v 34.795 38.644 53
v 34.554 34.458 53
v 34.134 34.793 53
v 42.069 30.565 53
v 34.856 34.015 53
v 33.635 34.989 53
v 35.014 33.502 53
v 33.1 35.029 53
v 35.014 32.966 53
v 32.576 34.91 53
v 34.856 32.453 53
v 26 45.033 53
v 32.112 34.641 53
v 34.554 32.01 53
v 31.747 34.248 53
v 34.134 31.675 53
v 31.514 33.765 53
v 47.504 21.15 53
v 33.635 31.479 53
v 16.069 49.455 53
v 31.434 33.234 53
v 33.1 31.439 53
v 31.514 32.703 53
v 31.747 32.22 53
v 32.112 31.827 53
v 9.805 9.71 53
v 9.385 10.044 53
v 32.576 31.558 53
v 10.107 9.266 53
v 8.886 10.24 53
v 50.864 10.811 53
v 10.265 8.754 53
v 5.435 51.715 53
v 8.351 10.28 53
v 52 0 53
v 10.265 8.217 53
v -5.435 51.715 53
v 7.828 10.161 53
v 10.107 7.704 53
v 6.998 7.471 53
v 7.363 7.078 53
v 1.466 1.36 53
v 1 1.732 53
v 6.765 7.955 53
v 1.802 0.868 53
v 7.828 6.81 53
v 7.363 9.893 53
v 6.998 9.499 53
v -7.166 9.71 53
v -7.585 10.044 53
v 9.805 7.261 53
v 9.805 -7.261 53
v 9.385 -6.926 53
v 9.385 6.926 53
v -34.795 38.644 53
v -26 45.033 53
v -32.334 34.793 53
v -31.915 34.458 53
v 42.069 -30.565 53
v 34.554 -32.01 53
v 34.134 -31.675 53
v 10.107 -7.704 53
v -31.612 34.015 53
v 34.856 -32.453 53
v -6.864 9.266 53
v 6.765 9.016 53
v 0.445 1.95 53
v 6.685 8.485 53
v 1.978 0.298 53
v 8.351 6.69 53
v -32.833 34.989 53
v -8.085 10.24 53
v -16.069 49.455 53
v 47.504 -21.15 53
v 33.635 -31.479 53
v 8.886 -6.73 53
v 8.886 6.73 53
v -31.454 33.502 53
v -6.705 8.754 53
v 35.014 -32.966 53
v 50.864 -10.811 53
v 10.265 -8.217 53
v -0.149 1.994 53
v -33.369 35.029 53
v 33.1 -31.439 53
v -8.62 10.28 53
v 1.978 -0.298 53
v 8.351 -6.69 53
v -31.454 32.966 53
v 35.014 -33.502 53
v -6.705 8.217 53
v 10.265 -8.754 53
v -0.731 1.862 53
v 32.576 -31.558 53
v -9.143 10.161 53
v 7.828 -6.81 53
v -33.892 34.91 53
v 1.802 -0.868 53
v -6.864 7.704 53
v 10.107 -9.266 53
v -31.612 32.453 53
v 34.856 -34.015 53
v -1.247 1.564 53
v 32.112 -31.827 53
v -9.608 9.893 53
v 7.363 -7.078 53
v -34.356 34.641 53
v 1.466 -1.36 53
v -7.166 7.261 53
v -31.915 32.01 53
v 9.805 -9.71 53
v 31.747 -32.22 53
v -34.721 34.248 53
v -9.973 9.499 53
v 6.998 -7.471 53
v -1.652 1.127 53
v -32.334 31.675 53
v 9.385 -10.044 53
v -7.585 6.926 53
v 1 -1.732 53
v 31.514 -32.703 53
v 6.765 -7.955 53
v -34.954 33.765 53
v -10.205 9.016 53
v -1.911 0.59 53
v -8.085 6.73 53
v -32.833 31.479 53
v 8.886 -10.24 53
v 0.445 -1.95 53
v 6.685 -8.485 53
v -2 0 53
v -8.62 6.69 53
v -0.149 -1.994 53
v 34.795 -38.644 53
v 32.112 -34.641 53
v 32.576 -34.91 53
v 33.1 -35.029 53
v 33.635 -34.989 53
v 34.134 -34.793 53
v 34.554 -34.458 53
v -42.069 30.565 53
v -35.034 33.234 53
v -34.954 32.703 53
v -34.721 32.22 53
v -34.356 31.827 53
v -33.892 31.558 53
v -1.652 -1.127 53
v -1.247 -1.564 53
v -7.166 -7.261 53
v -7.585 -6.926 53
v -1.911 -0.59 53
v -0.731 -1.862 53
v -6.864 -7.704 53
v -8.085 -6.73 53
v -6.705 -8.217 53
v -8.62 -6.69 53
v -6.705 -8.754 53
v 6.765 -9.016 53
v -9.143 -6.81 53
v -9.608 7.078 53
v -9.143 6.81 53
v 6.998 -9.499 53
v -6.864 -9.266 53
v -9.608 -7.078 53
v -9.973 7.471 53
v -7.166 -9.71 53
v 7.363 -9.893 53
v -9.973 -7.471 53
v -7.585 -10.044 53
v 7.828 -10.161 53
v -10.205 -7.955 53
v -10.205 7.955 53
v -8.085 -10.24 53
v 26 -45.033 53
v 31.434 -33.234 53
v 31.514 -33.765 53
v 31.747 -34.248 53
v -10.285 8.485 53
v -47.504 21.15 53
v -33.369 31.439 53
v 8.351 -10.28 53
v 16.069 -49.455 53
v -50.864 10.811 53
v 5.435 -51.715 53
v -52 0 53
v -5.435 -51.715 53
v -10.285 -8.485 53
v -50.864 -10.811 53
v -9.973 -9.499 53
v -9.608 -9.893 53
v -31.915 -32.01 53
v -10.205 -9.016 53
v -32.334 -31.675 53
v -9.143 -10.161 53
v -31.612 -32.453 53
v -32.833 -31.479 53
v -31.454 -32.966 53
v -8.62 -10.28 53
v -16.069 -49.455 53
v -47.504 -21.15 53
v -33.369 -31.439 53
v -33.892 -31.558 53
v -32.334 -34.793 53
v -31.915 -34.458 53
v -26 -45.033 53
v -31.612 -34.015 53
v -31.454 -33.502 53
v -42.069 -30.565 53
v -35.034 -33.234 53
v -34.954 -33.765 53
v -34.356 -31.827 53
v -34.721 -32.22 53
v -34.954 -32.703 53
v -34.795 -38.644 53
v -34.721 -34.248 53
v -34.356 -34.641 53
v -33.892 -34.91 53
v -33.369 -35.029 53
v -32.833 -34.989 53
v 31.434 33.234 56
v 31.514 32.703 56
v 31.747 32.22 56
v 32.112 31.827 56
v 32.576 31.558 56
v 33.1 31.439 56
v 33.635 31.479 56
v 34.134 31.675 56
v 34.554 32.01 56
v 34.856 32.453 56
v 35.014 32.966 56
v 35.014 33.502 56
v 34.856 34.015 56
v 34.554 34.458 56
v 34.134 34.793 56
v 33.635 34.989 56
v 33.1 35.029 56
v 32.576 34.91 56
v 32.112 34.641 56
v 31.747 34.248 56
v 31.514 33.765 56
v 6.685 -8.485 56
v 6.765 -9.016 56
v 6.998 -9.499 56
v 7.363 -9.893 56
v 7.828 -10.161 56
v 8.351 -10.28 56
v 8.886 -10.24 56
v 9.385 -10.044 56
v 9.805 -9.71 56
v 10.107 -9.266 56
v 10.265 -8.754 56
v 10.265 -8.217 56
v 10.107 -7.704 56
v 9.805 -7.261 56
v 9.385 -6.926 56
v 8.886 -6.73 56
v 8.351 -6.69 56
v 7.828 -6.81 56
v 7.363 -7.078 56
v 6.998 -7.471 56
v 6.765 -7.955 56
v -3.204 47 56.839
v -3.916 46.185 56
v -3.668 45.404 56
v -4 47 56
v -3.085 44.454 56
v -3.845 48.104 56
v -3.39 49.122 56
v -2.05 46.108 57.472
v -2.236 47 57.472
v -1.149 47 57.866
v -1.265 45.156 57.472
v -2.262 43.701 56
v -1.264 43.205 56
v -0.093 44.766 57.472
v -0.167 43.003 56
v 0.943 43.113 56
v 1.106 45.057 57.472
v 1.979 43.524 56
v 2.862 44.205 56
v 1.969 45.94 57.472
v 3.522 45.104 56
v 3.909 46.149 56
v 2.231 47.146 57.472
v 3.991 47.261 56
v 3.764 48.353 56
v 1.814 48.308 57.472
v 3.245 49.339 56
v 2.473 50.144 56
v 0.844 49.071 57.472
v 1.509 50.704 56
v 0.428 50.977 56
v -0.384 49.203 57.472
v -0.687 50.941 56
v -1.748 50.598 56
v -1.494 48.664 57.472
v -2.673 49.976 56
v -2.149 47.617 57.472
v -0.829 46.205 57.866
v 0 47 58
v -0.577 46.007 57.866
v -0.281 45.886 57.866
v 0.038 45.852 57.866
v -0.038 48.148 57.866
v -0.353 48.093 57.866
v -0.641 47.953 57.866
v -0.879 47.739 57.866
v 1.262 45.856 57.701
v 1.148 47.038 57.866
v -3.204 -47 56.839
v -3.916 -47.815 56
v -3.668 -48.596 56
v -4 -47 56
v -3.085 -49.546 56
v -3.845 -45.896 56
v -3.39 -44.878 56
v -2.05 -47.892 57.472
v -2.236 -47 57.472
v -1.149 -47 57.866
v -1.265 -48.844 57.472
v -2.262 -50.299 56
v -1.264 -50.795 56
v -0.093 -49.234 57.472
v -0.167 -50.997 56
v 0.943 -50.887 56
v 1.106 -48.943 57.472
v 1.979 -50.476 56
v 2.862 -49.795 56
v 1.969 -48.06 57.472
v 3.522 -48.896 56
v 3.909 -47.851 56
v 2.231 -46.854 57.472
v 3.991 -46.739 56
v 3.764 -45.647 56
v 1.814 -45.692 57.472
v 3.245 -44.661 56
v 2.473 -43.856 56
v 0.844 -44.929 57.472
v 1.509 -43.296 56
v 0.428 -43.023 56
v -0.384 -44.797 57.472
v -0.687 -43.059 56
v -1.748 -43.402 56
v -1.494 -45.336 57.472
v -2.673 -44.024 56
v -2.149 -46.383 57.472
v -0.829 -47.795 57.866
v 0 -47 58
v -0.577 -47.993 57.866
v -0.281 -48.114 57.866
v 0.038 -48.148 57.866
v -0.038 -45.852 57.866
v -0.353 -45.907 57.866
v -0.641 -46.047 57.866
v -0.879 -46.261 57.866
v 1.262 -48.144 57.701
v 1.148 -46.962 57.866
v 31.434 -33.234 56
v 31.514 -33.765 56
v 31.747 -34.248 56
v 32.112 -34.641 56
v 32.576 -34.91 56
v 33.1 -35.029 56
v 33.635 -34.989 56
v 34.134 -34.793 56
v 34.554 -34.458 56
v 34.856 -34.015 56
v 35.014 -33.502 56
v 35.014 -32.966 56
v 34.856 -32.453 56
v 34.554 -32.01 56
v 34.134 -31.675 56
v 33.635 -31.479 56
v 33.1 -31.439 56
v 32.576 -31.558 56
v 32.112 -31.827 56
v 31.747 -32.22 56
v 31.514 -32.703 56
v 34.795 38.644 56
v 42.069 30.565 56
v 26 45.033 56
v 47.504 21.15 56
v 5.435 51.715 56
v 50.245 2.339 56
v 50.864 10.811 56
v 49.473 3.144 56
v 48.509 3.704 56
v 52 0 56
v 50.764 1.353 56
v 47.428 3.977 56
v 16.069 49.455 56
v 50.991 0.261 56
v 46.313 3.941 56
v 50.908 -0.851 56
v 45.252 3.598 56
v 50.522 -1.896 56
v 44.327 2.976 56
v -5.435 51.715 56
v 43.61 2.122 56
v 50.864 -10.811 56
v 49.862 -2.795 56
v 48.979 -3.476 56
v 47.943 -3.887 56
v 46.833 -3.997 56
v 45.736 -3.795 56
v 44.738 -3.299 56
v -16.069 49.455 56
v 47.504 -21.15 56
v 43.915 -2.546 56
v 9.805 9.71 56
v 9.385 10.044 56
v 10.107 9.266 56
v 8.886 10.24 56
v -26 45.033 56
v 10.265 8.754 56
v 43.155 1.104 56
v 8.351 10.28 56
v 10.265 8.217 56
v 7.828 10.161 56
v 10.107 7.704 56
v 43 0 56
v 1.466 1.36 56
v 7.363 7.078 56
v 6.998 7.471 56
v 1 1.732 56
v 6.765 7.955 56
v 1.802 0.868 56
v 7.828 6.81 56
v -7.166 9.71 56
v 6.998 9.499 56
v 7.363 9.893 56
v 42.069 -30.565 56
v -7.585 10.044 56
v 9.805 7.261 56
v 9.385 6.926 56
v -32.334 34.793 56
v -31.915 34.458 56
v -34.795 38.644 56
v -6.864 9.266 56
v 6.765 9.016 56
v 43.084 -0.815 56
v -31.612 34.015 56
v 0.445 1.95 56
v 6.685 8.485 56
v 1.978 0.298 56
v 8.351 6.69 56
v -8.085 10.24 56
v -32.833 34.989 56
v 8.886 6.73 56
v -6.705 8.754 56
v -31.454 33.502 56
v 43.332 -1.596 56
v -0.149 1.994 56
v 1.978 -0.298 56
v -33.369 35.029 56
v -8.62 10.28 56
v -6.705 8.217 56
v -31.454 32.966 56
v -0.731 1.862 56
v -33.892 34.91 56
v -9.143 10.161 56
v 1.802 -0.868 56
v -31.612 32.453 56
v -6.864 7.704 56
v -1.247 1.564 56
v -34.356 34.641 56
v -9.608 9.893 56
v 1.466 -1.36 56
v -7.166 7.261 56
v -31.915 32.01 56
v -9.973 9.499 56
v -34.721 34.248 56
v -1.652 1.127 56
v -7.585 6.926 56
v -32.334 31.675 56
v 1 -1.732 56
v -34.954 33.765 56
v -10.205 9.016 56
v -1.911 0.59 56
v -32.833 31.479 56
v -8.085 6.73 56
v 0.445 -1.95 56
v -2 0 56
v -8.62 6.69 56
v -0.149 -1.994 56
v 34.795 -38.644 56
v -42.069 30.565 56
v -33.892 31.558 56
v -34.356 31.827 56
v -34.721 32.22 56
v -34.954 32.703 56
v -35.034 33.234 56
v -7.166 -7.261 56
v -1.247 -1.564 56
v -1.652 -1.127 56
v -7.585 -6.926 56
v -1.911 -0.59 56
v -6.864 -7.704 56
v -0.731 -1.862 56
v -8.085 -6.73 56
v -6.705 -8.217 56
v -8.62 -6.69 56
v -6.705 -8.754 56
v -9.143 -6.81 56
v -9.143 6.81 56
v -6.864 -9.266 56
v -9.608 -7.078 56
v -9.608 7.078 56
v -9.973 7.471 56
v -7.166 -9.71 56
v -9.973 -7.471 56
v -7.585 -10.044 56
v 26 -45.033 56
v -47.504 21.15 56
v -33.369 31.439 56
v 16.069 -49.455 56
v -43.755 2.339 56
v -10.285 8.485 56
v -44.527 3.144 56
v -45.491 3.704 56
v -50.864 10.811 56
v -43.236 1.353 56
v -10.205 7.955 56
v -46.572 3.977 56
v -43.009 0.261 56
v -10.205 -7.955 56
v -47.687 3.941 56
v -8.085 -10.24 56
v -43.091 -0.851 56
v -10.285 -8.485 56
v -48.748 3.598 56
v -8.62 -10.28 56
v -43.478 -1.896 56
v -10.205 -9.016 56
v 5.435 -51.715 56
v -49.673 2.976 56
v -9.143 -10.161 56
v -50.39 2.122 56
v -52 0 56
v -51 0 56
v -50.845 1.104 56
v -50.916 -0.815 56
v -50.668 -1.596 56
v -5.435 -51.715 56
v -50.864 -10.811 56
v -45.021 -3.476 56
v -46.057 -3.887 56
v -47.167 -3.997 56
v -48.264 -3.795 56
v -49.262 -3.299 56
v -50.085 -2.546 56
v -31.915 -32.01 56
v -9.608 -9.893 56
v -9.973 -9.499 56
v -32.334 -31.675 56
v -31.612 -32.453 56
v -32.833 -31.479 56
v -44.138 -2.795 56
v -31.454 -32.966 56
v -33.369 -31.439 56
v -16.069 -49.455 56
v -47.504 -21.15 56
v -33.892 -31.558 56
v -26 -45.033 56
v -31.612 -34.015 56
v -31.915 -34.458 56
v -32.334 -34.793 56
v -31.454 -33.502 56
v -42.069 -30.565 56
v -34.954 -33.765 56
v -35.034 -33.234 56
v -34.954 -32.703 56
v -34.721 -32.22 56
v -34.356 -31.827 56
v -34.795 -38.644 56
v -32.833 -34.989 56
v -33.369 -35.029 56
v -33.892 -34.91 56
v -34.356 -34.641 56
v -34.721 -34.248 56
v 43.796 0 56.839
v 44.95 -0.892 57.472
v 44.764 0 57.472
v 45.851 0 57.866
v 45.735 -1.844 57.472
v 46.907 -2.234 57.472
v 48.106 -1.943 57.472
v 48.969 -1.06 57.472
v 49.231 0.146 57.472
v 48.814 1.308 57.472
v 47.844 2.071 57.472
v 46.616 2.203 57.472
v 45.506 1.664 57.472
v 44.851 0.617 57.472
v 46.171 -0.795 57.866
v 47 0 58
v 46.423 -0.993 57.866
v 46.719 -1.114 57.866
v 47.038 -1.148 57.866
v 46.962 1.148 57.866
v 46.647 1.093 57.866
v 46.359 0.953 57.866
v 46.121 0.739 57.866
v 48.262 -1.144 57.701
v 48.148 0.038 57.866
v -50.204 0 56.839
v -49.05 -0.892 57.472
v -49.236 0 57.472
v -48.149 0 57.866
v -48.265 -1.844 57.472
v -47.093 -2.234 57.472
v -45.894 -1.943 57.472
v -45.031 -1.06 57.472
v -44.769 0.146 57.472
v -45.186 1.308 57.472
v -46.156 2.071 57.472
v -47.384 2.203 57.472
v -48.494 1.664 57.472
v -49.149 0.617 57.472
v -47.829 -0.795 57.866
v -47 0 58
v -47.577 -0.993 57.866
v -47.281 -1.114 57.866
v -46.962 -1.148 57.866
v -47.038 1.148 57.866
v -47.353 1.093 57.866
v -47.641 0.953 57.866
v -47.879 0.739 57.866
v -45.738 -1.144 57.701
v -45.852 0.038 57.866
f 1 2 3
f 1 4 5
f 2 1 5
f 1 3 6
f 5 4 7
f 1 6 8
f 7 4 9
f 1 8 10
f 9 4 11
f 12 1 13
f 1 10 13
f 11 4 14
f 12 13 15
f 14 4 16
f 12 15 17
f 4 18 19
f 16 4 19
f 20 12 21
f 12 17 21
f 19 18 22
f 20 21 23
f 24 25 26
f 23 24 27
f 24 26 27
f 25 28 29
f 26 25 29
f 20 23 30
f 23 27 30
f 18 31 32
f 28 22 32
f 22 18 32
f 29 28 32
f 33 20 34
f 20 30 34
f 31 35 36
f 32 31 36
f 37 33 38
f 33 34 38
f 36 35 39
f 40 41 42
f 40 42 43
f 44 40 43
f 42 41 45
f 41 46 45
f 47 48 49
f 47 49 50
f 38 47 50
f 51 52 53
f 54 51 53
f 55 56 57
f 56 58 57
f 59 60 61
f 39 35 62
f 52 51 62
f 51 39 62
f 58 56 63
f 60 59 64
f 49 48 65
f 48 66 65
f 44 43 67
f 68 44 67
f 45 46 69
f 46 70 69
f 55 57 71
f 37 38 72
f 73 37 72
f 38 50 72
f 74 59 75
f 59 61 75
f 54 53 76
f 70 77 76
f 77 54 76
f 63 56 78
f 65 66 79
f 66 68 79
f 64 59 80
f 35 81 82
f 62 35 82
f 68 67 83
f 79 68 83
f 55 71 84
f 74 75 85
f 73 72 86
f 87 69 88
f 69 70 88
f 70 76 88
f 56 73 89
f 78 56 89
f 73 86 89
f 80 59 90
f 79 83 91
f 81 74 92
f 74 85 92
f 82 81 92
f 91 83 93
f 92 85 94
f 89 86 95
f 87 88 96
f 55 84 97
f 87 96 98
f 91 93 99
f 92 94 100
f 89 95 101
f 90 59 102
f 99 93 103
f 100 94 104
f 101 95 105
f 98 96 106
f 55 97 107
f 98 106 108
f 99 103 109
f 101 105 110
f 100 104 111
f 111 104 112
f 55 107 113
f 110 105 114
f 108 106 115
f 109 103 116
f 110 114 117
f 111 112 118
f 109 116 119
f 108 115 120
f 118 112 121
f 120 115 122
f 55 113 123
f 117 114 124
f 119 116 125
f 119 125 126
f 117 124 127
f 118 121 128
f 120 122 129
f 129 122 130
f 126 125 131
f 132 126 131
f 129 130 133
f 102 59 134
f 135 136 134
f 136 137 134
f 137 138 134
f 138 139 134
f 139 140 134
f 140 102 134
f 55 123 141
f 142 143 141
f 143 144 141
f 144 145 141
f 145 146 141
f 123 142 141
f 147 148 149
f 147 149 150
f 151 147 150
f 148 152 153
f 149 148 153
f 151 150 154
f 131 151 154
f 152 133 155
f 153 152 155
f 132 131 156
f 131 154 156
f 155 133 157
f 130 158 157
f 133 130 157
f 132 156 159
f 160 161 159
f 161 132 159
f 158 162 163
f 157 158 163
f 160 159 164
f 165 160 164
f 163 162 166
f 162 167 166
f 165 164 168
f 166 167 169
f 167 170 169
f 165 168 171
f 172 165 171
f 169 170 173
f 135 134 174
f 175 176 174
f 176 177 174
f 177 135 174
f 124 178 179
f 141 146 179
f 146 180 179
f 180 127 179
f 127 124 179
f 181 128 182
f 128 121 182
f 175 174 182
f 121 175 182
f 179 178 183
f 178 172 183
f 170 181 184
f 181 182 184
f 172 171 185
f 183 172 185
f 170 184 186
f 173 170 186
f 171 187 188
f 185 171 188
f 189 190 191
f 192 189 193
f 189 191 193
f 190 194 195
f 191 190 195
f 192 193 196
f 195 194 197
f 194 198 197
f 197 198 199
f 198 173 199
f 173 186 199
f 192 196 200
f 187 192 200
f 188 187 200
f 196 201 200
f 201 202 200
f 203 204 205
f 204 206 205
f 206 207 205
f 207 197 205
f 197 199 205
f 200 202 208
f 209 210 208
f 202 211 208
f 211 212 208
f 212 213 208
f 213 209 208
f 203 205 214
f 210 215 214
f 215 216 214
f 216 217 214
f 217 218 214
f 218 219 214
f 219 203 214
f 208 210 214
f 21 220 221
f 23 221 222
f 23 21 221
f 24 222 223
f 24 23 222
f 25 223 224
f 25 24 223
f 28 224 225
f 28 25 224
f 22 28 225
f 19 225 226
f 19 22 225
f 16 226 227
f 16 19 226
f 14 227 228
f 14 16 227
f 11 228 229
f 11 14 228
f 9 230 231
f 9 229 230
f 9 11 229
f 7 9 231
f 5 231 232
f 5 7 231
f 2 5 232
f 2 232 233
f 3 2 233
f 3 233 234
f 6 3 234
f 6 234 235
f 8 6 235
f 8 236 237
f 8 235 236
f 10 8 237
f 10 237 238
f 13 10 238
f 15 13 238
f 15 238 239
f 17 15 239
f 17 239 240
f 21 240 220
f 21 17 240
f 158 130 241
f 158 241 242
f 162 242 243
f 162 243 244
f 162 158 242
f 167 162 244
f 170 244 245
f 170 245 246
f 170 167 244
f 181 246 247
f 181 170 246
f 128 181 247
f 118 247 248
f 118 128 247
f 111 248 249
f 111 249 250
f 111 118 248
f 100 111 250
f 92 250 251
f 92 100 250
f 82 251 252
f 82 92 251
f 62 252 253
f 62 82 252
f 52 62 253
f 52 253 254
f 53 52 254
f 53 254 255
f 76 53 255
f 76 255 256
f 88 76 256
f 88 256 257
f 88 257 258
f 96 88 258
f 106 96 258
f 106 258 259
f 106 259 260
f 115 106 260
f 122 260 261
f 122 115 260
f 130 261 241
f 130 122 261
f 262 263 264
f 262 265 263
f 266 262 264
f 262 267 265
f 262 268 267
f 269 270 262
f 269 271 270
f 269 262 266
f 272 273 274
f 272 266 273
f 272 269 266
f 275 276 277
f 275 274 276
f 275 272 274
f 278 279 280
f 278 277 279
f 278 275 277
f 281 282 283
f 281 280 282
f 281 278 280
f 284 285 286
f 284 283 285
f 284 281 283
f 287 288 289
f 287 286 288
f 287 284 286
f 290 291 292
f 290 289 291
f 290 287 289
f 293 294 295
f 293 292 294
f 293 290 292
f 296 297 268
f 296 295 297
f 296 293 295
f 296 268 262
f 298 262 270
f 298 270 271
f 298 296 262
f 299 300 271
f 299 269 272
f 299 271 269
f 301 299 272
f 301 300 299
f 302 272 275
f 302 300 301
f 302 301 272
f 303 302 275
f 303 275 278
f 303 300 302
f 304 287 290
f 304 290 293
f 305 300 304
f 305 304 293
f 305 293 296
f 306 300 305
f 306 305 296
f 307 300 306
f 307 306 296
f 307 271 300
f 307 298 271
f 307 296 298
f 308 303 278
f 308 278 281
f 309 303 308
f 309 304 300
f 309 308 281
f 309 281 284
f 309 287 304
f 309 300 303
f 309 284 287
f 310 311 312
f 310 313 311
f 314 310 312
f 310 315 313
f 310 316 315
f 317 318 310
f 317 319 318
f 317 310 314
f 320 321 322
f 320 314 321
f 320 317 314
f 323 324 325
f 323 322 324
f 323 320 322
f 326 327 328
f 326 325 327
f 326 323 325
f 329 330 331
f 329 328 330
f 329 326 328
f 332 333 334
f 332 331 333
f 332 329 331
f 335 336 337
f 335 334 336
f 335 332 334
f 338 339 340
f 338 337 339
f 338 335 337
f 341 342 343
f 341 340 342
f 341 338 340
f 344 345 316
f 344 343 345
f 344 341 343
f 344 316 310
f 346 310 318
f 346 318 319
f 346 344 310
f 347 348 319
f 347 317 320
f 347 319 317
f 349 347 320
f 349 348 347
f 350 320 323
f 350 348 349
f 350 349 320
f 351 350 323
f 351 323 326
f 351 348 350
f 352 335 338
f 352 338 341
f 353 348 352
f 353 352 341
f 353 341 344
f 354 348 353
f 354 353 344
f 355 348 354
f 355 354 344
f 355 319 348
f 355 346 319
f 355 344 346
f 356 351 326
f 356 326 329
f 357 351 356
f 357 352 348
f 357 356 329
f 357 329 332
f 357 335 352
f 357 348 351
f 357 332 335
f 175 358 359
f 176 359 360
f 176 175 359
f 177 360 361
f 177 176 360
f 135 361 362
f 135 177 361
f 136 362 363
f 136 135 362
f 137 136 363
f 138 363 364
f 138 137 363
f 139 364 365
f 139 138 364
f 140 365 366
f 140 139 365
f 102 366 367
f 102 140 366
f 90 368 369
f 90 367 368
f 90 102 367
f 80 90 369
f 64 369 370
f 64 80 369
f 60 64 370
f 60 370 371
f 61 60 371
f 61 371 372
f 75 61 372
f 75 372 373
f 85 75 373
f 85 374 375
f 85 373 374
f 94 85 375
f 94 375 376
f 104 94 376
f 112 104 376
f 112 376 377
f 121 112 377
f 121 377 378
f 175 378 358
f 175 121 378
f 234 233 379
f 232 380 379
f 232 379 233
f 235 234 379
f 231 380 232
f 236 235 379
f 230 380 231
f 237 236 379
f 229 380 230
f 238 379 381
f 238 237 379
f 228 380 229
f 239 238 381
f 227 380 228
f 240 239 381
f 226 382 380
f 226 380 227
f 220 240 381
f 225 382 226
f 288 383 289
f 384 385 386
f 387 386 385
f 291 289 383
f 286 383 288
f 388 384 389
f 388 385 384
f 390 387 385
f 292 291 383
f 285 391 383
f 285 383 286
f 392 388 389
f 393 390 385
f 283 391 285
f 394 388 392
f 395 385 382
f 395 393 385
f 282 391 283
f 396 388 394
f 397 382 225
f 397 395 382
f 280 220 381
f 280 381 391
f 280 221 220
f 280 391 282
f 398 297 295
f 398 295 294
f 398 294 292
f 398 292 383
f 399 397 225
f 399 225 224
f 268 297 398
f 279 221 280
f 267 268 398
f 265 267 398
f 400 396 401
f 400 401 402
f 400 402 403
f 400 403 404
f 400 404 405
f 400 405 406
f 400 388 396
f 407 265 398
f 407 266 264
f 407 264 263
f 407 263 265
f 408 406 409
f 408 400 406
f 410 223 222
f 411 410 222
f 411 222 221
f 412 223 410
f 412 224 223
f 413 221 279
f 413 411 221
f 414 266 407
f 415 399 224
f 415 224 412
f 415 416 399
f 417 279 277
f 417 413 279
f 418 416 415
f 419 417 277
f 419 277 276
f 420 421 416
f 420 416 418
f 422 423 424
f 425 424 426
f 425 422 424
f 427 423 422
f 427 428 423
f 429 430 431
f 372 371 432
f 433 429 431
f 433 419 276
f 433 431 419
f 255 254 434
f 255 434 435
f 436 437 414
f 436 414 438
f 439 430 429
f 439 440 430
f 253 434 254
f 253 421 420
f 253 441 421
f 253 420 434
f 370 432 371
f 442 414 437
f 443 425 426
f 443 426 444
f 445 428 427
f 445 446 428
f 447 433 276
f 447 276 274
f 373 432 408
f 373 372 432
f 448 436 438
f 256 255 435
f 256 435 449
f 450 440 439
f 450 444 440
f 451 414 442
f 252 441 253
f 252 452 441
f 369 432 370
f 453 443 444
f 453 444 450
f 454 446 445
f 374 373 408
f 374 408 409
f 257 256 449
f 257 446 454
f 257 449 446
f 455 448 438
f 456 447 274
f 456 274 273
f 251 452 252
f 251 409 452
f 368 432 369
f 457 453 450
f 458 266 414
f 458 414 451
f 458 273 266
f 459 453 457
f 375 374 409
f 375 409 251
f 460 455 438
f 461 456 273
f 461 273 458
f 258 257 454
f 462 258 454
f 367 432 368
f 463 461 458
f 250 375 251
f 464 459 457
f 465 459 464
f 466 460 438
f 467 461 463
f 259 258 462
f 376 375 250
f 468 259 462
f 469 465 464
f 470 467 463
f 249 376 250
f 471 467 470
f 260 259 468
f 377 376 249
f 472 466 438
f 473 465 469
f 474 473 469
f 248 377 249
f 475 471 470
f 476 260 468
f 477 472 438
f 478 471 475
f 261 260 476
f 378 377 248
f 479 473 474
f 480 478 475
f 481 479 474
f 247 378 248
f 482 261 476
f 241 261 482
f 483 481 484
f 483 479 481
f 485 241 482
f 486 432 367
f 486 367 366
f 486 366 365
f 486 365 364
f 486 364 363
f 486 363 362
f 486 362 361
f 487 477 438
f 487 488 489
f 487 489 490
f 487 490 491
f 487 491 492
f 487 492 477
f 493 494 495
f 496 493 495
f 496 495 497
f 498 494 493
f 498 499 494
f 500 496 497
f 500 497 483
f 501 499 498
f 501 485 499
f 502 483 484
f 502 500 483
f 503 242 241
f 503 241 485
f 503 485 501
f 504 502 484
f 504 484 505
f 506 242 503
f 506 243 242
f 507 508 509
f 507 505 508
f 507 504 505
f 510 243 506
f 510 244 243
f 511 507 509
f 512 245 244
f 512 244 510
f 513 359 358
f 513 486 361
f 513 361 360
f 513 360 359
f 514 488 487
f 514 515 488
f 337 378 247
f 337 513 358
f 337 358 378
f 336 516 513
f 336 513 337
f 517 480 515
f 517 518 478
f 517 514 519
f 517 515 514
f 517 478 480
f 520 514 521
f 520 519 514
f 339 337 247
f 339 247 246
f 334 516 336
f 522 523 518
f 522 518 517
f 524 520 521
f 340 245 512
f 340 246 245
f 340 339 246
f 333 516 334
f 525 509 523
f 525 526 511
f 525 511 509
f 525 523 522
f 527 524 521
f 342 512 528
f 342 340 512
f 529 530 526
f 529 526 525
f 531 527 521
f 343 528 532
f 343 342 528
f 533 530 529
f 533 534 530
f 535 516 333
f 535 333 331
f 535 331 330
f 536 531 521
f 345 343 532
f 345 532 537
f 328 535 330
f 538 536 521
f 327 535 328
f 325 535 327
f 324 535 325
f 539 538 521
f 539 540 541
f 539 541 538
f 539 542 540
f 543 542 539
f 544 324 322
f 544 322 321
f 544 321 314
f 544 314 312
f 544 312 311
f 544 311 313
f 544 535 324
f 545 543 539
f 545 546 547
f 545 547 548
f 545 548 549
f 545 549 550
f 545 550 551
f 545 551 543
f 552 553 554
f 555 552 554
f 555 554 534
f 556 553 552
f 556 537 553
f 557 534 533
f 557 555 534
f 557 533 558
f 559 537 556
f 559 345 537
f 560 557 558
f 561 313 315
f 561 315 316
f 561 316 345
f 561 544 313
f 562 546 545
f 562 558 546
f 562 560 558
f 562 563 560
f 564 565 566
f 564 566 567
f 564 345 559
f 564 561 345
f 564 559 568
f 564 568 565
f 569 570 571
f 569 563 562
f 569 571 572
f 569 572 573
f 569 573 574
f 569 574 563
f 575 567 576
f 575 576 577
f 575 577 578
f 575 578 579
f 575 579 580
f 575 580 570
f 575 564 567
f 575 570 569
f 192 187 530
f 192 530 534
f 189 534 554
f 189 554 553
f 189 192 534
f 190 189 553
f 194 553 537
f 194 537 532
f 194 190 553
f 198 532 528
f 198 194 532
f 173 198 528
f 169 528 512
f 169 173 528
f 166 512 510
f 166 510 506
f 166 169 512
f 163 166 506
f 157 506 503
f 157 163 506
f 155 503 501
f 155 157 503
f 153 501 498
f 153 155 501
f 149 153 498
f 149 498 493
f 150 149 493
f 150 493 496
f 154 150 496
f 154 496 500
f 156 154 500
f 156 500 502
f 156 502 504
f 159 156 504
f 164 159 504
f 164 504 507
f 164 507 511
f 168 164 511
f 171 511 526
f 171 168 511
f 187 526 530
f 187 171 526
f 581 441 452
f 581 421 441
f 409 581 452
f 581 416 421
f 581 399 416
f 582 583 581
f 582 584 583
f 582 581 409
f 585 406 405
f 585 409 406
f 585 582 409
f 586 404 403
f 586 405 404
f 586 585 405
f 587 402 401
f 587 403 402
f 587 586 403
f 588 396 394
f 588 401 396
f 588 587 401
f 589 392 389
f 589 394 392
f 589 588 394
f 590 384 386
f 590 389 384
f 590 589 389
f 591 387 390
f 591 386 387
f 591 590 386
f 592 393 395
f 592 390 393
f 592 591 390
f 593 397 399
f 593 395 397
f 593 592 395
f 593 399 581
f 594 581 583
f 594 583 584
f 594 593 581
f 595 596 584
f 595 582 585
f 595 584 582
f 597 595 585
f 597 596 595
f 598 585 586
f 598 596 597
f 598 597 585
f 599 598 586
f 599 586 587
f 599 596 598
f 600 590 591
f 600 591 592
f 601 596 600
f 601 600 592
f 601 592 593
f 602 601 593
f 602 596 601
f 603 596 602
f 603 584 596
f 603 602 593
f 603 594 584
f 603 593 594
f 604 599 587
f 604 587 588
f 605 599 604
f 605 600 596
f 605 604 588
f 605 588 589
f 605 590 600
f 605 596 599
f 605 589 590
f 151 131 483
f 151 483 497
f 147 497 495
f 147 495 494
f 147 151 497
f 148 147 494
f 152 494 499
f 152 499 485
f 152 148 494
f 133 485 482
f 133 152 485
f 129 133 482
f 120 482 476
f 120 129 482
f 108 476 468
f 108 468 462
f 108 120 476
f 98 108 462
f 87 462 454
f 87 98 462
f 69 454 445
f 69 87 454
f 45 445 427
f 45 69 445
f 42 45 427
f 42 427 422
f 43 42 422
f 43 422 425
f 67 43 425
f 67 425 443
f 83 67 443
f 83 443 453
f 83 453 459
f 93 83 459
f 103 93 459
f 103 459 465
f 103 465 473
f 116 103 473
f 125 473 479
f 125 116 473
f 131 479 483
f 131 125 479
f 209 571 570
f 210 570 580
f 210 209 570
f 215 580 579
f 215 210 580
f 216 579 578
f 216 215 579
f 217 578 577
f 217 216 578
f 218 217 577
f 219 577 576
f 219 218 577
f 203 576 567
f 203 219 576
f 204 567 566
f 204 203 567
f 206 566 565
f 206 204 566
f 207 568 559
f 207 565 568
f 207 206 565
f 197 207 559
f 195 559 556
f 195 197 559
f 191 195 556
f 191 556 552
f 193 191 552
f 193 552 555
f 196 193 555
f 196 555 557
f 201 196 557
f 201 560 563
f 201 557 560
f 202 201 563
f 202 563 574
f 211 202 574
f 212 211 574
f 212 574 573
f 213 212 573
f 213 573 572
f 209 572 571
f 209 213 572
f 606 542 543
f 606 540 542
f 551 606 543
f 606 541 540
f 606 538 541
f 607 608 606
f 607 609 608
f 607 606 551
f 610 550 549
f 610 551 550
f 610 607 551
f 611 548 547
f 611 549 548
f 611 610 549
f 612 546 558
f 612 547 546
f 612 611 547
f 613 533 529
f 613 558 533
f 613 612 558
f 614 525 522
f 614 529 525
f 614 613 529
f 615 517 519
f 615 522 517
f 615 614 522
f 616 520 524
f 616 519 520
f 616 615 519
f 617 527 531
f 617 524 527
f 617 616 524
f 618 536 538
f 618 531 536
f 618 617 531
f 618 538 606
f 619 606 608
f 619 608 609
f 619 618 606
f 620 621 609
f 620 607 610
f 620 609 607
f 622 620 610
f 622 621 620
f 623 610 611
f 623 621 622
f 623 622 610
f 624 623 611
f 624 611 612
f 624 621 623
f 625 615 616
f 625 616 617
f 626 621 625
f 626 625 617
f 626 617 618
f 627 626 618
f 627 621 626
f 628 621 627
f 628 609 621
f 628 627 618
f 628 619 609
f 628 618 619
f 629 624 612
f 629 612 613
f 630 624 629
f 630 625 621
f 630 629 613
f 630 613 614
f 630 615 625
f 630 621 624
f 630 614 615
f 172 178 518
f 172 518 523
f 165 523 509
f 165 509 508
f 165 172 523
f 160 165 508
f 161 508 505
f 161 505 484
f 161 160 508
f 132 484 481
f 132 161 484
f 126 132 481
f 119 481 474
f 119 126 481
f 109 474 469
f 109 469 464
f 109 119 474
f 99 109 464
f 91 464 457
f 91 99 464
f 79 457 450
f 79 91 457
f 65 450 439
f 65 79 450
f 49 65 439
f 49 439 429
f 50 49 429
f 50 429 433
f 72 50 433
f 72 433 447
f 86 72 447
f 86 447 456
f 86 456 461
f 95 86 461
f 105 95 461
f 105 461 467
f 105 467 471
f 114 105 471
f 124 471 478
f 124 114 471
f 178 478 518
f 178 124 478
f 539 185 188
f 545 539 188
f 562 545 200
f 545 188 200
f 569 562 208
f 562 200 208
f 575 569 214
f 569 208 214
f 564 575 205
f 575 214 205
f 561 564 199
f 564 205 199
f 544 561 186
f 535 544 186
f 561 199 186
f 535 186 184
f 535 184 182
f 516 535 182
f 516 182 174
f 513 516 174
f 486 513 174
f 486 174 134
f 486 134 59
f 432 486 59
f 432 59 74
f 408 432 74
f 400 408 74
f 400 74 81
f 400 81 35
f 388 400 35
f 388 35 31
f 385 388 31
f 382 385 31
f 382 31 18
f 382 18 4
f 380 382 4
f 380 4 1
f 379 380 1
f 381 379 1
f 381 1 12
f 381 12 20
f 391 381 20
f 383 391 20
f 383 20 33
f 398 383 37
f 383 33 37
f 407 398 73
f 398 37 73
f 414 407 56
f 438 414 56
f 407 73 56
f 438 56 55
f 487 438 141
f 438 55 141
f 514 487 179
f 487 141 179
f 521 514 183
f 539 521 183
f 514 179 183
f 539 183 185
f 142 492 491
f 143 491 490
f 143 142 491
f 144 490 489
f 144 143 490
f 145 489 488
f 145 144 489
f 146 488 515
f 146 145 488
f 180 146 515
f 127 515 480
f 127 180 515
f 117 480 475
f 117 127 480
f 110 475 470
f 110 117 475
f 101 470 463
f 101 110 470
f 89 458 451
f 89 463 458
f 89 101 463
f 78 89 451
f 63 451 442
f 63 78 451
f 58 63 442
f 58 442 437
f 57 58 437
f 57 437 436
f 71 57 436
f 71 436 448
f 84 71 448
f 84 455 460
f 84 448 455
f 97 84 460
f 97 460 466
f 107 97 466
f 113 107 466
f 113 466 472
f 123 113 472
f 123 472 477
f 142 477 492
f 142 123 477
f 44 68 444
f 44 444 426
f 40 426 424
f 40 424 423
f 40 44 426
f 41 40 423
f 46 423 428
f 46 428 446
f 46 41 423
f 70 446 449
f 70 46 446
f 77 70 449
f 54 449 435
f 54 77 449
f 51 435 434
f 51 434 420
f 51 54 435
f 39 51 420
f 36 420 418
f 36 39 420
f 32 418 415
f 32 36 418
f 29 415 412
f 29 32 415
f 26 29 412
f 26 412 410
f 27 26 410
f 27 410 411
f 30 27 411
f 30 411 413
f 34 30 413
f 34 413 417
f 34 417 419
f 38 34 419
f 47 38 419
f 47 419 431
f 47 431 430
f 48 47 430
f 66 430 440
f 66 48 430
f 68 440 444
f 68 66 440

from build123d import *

# Parameters (mm, degrees)
SKETCH004_R             = 52
SKETCH004_R_2           = 2
SKETCH004_R_3           = 1.8
PAD003_DEPTH            = 3
SKETCH006_R             = 1.8
POCKET001_DEPTH         = 0.001
POCKET001_DEPTH_BACK    = 3.001
BODY002_PLACEMENT_ANGLE = 180


with BuildPart() as part:
    # Sketch004 → Pad003 (new body)
    with BuildSketch(Plane.XY):
        Circle(SKETCH004_R)
        Circle(SKETCH004_R_2, mode=Mode.SUBTRACT)
        with Locations((8.485281, 8.485281)):
            Circle(SKETCH004_R_3, mode=Mode.SUBTRACT)
        with Locations((-8.485281, 8.485281)):
            Circle(SKETCH004_R_3, mode=Mode.SUBTRACT)
        with Locations((-8.485281, -8.485281)):
            Circle(SKETCH004_R_3, mode=Mode.SUBTRACT)
        with Locations((8.485281, -8.485281)):
            Circle(SKETCH004_R_3, mode=Mode.SUBTRACT)
    extrude(amount=PAD003_DEPTH)

    # Sketch006 → Pocket001 (cut, two sides)
    with BuildSketch(Plane.XY) as pocket001_sk:
        with Locations((-33.234019, 33.234019)):
            Circle(SKETCH006_R)
        with Locations((-33.234019, -33.234019)):
            Circle(SKETCH006_R)
        with Locations((33.234019, -33.234019)):
            Circle(SKETCH006_R)
        with Locations((33.234019, 33.234019)):
            Circle(SKETCH006_R)
    extrude(amount=-POCKET001_DEPTH, mode=Mode.SUBTRACT)
    extrude(pocket001_sk.sketch, amount=POCKET001_DEPTH_BACK, mode=Mode.SUBTRACT)

    # Sphere → Sphere (revolve)
    with BuildSketch(Plane.XZ.offset(-47)):
        with BuildLine():
            ThreePointArc((5, 0), (3.535534, 3.535534), (0, 5))
            Line((0, 5), (0, 0))
            Line((0, 0), (5, 0))
        make_face()
    revolve(axis=Axis((0, 47, 0), (0, 0, 1)))

    # Sphere001 → Sphere001 (revolve)
    with BuildSketch(Plane.XZ.offset(47)):
        with BuildLine():
            ThreePointArc((5, 0), (3.535534, 3.535534), (0, 5))
            Line((0, 5), (0, 0))
            Line((0, 0), (5, 0))
        make_face()
    revolve(axis=Axis((0, -47, 0), (0, 0, 1)))

    # Sphere002 → Sphere002 (revolve)
    with BuildSketch(Plane(origin=(47, 0, 0), x_dir=(1, 0, 0), z_dir=(0, -1, 0))):
        with BuildLine():
            ThreePointArc((5, 0), (3.535534, 3.535534), (0, 5))
            Line((0, 5), (0, 0))
            Line((0, 0), (5, 0))
        make_face()
    revolve(axis=Axis((47, 0, 0), (0, 0, 1)))

    # Sphere003 → Sphere003 (revolve)
    with BuildSketch(Plane(origin=(-47, 0, 0), x_dir=(1, 0, 0), z_dir=(0, -1, 0))):
        with BuildLine():
            ThreePointArc((5, 0), (3.535534, 3.535534), (0, 5))
            Line((0, 5), (0, 0))
            Line((0, 0), (5, 0))
        make_face()
    revolve(axis=Axis((-47, 0, 0), (0, 0, 1)))


with BuildPart() as part_1:
    # Body002 placement: moved
    add(part.part.moved(Location((0, 0, 53))).rotate(Axis((0, 0, 53), (0, 0, -1)), BODY002_PLACEMENT_ANGLE))


solid = part_1.part
